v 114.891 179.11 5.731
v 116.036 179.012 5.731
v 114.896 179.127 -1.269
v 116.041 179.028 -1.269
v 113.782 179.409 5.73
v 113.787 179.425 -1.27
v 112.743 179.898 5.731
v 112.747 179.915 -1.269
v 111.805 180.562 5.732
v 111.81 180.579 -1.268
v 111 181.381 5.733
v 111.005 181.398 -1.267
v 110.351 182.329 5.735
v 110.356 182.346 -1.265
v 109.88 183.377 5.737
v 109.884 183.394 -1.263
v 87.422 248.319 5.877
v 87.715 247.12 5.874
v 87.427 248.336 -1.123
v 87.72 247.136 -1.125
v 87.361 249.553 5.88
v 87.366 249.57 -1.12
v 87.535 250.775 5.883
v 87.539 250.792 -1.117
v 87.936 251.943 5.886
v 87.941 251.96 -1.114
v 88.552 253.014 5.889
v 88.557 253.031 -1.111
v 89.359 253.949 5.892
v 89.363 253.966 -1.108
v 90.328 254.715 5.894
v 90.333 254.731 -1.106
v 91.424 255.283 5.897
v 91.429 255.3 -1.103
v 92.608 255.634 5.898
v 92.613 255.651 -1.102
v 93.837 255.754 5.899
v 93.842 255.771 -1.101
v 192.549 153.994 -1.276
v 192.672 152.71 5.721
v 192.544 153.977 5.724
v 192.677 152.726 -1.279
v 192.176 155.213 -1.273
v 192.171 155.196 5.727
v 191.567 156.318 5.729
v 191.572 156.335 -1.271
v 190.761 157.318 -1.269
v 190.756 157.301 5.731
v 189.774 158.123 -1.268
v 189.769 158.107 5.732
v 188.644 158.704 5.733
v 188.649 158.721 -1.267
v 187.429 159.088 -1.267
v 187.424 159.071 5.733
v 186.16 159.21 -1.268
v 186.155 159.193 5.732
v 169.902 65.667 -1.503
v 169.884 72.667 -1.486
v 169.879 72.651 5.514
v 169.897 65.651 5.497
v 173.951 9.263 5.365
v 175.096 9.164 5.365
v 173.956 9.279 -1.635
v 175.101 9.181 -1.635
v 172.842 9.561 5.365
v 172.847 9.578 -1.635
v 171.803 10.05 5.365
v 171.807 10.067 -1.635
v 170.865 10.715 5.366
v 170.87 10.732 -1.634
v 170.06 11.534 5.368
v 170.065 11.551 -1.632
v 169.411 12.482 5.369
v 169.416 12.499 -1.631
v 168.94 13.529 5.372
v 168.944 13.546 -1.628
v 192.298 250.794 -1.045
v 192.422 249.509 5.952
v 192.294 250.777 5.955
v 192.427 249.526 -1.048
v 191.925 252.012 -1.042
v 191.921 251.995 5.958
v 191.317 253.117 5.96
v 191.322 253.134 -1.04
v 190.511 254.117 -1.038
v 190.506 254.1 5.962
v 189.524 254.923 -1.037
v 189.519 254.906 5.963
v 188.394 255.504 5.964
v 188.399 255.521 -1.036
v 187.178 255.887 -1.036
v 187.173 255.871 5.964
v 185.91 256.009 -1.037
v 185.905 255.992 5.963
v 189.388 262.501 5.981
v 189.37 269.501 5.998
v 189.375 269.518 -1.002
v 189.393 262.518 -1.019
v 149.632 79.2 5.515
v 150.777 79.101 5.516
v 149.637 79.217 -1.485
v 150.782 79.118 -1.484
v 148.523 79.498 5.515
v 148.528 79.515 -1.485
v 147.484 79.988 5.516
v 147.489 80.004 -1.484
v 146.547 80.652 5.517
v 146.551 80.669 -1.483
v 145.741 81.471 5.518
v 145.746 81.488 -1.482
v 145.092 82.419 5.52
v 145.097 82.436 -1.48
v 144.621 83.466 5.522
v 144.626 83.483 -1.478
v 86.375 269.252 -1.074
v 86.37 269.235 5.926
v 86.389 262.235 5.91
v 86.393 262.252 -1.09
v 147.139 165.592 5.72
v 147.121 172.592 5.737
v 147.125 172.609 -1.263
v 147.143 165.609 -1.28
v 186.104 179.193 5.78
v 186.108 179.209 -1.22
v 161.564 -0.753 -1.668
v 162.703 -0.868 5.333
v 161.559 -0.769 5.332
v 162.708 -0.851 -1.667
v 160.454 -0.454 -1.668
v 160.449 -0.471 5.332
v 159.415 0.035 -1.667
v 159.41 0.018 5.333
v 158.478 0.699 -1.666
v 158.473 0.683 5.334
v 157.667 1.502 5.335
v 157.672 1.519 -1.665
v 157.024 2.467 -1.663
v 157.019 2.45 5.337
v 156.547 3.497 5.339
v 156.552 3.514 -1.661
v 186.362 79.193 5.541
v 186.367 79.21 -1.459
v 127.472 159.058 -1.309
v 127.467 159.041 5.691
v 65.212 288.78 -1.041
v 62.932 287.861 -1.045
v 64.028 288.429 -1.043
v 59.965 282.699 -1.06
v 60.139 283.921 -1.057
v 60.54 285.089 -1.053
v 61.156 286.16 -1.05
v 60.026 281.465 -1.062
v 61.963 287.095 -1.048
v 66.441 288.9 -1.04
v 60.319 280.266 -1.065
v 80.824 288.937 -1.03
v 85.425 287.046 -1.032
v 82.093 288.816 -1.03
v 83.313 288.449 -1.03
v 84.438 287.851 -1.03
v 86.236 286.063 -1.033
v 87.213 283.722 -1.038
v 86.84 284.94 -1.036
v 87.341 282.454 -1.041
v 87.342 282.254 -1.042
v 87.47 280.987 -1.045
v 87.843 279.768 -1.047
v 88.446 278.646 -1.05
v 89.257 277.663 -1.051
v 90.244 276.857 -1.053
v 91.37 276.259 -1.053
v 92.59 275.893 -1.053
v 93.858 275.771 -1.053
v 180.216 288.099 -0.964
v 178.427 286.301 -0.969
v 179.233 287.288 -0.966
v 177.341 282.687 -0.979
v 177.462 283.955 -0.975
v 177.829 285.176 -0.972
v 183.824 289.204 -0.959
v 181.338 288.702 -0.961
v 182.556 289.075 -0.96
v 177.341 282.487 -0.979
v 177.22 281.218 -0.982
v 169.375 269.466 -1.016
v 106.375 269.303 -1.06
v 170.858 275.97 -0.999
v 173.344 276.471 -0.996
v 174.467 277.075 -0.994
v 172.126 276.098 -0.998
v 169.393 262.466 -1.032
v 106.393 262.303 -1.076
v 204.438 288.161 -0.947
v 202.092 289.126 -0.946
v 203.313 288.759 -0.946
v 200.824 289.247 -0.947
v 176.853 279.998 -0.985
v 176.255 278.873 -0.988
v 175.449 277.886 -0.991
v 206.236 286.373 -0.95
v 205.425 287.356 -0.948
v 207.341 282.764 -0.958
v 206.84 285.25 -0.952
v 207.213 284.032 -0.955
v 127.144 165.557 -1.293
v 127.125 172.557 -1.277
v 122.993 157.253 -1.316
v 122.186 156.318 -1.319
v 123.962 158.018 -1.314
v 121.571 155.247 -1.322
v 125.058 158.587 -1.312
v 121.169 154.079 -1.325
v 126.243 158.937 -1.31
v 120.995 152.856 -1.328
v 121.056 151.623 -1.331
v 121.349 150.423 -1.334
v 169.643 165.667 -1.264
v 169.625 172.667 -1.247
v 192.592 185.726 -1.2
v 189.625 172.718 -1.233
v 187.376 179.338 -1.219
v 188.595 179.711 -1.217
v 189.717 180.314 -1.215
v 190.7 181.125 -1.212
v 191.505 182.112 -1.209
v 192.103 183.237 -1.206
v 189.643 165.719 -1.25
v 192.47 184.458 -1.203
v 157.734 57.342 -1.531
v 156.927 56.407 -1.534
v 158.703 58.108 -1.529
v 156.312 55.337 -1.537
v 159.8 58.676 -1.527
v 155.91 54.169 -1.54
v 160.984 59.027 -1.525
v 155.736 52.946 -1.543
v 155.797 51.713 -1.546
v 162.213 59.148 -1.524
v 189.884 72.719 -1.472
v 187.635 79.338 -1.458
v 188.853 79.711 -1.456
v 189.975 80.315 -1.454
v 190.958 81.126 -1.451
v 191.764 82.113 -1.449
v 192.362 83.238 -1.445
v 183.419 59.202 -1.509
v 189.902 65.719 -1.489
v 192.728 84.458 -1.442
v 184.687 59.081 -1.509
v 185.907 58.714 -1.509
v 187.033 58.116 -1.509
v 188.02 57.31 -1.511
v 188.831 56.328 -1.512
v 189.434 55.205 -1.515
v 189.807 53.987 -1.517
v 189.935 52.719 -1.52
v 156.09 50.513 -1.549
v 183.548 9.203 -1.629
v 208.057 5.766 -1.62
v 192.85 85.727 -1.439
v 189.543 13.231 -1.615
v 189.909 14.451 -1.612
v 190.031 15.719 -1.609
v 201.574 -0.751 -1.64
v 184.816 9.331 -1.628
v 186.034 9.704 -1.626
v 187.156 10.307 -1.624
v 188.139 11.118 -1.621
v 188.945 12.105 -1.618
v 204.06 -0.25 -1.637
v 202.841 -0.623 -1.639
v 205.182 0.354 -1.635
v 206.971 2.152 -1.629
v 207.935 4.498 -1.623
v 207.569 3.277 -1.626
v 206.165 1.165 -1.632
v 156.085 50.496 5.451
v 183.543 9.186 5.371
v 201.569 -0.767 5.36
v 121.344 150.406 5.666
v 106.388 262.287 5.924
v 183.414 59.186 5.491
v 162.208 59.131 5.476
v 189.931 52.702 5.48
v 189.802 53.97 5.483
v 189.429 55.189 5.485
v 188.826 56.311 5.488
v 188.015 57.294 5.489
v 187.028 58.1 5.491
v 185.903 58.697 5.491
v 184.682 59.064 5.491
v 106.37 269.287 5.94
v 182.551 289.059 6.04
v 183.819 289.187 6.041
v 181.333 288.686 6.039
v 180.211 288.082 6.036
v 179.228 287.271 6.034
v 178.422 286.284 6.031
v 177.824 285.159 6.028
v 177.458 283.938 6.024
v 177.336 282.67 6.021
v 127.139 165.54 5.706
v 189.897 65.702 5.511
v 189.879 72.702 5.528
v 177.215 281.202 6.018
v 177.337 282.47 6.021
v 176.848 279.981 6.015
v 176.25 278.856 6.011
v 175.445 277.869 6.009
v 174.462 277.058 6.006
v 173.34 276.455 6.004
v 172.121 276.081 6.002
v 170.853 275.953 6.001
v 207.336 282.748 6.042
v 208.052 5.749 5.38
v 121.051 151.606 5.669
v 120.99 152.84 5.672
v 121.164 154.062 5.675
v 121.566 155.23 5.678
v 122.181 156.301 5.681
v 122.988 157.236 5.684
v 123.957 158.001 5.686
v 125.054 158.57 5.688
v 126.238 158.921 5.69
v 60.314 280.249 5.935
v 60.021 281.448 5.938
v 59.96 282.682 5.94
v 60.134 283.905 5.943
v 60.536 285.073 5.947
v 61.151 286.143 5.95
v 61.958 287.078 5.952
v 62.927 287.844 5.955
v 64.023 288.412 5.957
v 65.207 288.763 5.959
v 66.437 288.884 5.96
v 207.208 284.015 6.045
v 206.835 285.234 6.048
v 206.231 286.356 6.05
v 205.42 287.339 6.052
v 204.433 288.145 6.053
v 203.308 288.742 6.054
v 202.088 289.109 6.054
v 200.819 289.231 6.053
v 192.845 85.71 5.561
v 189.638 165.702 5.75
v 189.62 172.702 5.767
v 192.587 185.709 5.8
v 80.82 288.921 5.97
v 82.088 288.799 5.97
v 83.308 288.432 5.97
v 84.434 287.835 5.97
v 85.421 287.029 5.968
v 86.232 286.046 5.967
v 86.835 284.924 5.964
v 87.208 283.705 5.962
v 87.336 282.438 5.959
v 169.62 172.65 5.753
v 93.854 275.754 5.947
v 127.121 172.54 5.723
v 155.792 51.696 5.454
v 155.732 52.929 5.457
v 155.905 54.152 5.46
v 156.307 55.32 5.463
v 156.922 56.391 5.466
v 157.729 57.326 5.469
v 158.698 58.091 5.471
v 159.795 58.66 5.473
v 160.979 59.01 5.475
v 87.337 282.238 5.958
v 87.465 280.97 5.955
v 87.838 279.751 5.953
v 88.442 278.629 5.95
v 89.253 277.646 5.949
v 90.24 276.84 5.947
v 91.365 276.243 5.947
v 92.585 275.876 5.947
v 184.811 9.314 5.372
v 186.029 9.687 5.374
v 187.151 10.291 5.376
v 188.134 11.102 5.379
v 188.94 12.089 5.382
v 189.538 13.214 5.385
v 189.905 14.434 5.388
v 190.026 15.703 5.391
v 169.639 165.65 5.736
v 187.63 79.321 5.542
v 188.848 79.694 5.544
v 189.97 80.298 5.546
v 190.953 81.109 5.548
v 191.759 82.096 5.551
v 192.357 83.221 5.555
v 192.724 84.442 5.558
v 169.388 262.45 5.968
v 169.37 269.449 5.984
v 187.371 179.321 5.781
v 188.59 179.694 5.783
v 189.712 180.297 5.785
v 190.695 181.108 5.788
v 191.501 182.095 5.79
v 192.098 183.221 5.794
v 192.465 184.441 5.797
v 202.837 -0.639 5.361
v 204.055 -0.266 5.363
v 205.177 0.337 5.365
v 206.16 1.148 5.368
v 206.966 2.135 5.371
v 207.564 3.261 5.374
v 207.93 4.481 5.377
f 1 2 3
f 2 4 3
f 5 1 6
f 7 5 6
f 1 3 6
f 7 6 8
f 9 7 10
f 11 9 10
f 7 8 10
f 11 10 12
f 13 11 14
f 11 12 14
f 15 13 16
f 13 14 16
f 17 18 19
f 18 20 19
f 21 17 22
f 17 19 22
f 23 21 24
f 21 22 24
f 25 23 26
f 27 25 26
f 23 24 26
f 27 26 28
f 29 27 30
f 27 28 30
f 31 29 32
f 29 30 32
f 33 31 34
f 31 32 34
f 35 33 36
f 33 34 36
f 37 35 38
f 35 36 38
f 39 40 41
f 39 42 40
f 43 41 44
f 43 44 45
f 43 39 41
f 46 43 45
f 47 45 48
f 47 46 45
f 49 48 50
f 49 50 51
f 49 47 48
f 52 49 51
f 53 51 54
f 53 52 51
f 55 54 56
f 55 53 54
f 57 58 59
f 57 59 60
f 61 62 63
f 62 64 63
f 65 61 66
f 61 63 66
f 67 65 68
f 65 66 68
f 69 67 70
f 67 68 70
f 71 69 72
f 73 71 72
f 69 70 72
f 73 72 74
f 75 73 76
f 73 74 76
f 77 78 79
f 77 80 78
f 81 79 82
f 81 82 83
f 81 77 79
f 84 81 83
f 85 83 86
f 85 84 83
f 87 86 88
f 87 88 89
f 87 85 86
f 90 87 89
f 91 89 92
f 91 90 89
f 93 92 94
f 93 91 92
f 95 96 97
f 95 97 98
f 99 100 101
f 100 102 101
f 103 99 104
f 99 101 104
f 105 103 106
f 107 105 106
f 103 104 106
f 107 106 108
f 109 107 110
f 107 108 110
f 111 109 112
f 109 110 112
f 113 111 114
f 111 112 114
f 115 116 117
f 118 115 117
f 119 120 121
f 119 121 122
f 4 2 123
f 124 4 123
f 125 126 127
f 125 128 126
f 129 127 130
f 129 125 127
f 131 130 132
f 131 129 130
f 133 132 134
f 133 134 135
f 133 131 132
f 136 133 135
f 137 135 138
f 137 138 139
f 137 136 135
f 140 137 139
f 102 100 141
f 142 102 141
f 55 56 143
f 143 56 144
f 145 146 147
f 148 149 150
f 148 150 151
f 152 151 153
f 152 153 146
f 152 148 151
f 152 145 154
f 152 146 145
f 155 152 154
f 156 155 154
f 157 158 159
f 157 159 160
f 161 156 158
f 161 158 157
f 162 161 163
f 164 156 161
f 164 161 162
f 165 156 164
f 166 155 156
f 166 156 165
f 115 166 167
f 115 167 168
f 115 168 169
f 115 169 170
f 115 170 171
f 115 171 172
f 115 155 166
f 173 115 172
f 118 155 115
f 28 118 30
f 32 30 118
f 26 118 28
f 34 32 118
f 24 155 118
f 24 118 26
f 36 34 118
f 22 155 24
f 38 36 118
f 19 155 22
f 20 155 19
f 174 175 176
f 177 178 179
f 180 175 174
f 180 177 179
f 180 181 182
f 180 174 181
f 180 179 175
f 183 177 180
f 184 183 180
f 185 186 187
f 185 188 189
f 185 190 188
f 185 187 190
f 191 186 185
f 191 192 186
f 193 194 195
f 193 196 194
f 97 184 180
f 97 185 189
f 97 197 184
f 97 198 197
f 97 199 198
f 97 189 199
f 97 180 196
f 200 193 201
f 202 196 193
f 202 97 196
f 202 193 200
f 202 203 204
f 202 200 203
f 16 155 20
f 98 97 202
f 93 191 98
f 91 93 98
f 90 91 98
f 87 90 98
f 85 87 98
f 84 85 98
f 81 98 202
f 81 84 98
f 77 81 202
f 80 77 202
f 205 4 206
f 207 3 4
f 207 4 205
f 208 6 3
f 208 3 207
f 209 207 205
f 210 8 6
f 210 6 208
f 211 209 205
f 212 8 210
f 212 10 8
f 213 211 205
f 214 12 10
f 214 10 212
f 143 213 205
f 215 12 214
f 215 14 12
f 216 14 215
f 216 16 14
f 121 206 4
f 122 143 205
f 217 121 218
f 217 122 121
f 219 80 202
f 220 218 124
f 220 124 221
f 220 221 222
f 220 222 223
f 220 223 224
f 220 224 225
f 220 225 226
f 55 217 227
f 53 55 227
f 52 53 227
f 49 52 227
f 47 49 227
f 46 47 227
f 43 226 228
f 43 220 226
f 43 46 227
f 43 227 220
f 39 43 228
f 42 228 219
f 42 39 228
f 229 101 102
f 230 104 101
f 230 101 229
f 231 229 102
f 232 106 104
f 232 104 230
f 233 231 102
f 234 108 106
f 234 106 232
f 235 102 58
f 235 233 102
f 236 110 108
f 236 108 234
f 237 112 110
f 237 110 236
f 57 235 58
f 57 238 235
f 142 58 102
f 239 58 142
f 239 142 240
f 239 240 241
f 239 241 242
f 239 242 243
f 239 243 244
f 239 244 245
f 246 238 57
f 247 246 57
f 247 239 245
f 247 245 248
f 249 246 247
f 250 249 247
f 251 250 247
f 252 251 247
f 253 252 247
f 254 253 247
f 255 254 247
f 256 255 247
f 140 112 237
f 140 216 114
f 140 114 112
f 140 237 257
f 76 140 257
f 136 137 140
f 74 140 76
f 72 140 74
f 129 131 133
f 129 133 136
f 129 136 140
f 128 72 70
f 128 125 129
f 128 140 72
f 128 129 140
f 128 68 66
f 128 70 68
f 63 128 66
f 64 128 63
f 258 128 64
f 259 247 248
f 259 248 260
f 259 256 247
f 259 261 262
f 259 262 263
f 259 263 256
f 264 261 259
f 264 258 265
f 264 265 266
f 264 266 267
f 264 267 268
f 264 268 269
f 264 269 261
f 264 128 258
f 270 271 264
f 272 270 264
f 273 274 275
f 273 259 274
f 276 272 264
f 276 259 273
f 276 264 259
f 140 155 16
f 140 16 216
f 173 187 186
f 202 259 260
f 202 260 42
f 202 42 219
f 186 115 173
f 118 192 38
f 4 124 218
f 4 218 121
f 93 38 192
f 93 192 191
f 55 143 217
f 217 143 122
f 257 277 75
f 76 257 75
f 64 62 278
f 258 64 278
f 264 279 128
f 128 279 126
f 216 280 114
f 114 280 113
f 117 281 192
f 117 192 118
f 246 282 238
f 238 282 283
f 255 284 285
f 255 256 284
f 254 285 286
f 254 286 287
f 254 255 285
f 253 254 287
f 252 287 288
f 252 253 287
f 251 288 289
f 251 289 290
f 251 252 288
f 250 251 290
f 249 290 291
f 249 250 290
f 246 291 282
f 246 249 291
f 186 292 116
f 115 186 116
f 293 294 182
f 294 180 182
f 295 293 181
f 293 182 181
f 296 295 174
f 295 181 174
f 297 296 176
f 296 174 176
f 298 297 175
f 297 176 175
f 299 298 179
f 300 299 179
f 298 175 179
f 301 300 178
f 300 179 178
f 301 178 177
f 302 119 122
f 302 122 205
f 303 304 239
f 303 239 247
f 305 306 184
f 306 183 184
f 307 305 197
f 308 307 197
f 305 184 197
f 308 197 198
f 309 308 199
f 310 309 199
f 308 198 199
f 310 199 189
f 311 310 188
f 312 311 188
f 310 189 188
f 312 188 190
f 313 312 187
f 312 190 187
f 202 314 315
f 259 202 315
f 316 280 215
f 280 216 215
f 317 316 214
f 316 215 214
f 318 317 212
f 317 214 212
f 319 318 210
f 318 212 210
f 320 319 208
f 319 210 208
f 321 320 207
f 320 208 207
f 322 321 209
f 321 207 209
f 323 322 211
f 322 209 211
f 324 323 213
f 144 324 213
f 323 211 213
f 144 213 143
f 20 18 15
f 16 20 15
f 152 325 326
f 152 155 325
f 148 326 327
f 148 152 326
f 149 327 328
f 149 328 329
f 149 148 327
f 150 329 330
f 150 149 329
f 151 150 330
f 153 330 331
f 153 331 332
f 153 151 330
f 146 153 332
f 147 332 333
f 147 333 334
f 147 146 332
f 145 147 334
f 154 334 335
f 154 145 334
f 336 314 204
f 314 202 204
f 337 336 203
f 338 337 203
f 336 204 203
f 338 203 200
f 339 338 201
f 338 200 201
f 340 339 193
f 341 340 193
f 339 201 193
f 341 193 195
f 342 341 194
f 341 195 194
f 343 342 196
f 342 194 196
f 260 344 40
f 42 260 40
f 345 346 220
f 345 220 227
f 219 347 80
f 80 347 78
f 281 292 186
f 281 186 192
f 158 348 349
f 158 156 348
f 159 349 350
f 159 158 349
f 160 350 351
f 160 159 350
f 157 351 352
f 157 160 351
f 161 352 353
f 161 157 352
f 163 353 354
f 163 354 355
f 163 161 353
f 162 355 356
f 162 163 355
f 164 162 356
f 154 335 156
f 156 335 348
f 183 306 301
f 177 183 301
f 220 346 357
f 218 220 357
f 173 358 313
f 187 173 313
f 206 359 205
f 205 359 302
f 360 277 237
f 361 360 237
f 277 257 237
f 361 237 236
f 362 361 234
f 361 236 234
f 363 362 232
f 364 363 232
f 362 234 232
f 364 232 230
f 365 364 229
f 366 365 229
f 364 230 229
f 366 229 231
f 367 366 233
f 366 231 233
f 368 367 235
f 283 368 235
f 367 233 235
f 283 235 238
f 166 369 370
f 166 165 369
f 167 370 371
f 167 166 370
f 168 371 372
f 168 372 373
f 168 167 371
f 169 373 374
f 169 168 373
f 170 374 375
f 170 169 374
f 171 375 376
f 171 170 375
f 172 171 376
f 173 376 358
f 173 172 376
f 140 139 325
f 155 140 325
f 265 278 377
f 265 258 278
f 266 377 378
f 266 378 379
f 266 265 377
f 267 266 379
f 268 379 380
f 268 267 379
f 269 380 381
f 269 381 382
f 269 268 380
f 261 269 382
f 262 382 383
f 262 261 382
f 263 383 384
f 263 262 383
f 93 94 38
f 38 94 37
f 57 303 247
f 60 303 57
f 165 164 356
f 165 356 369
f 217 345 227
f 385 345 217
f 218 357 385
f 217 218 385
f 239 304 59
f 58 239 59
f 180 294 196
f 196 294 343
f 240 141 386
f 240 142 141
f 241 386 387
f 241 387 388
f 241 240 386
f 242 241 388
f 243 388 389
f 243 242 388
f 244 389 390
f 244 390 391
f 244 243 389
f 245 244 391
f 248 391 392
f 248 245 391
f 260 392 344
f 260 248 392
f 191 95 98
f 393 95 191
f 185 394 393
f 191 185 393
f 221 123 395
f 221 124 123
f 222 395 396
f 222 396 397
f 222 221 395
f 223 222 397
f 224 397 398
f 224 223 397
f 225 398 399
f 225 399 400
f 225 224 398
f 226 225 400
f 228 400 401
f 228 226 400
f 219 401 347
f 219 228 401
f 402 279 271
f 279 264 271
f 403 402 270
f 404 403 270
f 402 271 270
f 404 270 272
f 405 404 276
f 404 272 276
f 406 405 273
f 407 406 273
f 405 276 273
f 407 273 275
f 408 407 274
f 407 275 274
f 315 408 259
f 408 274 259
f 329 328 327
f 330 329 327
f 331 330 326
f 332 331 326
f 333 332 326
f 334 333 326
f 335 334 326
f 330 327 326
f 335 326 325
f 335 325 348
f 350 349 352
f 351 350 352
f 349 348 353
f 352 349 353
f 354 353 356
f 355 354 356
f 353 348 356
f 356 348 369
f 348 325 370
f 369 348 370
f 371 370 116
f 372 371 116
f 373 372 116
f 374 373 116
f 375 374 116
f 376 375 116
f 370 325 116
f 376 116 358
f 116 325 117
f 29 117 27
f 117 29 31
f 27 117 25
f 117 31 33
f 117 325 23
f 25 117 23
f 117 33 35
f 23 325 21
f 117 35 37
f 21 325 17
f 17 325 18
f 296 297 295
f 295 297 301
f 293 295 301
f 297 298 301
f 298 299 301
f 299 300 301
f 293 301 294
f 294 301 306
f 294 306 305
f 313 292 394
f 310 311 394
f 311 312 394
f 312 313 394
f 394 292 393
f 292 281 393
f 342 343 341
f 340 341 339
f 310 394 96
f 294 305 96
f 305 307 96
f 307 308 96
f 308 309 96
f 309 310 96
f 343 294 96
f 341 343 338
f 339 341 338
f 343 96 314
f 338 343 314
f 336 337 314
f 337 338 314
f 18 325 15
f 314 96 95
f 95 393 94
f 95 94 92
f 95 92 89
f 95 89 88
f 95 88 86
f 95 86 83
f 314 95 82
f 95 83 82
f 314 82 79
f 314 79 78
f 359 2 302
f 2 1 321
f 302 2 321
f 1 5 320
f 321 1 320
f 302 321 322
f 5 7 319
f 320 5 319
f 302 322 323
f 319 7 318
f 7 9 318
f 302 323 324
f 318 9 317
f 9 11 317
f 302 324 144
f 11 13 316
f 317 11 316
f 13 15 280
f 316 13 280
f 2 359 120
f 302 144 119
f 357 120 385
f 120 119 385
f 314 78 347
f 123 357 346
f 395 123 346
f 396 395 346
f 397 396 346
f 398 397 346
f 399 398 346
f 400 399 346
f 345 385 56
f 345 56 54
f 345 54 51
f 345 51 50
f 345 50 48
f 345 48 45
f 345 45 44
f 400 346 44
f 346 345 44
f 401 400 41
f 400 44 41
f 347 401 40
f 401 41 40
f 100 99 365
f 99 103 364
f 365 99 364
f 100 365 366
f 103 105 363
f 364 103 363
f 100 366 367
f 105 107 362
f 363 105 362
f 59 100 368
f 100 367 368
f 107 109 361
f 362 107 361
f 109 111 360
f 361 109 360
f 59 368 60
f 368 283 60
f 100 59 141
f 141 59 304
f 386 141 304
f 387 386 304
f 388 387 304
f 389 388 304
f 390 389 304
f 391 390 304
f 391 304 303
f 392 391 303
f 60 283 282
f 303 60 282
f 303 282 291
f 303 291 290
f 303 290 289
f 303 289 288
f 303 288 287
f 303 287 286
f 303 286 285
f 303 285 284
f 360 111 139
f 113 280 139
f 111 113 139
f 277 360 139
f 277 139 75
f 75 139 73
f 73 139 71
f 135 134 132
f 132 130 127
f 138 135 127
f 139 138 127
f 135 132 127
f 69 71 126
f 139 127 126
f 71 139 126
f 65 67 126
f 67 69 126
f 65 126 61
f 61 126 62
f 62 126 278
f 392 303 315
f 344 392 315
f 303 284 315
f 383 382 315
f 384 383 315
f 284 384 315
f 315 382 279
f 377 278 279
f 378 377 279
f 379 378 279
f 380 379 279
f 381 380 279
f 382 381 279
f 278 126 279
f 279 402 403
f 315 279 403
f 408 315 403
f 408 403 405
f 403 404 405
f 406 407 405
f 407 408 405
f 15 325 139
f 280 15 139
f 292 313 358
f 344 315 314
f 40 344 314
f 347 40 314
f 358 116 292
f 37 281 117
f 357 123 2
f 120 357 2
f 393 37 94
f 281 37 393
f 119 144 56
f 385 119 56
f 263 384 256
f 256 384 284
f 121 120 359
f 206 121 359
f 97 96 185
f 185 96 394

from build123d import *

# Parameters (mm, degrees)
SKETCH_W               = 20
SKETCH_H               = 7
PAD_DEPTH              = 7
FILLET_R               = 6.5
MIRROR_ROLL_ANGLE      = -179.860318
MIRROR_PITCH_ANGLE     = 1.669328
MIRROR_PLACEMENT_ANGLE = 0.337481


with BuildPart() as body:
    # Sketch → Pad (new body)
    with BuildSketch(Plane.XY):
        Polygon((0, 290), (50, 290), (150, 0), (120, 0), (120, 13.2), (30, 13.2), (30, 0), (0, 0), align=None)
        Polygon((15, 210), (15, 130), (89.30566, 130), (61.719453, 210), align=None, mode=Mode.SUBTRACT)
        Polygon((15, 110), (15, 33.2), (122.684971, 33.2), (96.202212, 110), align=None, mode=Mode.SUBTRACT)
        Polygon((18, 280), (18, 230), (54.822902, 230), (37.581522, 280), align=None, mode=Mode.SUBTRACT)
        with Locations((28, 220)):
            Rectangle(SKETCH_W, SKETCH_H, mode=Mode.SUBTRACT)
        with Locations((28, 120)):
            Rectangle(SKETCH_W, SKETCH_H, mode=Mode.SUBTRACT)
        with Locations((70.5, 120)):
            Rectangle(SKETCH_W, SKETCH_H, mode=Mode.SUBTRACT)
        with Locations((28, 23.2)):
            Rectangle(SKETCH_W, SKETCH_H, mode=Mode.SUBTRACT)
        with Locations((111, 23.2)):
            Rectangle(SKETCH_W, SKETCH_H, mode=Mode.SUBTRACT)
    extrude(amount=PAD_DEPTH)

    # Fillet
    fillet_edges = [body.edges().sort_by_distance(p)[0] for p in [
        (0, 0, 3.5),
        (50, 290, 3.5),
        (0, 290, 3.5),
        (150, 0, 3.5),
        (120, 0, 3.5),
        (30, 0, 3.5),
        (61.719453, 210, 3.5),
        (15, 210, 3.5),
        (96.202212, 110, 3.5),
        (15, 110, 3.5),
        (15, 130, 3.5),
        (15, 33.2, 3.5),
        (122.684971, 33.2, 3.5),
        (89.30566, 130, 3.5),
        (30, 13.2, 3.5),
        (120, 13.2, 3.5),
        (18, 280, 3.5),
        (18, 230, 3.5),
        (37.581522, 280, 3.5),
        (54.822902, 230, 3.5),
    ]]
    fillet(fillet_edges, radius=FILLET_R)


with BuildPart() as body_1:
    # Body placement: moved
    add(body.part.moved(Location((-2, 0, 0))))


with BuildPart() as body_mirrored:
    # mirror: instance of Body
    add(body_1.part.mirror(Plane(origin=(159.181488, 124.226166, 5.790833), x_dir=(-0.001618, 0.999999, 0), z_dir=(-0.999887, -0.001617, 0.014919))))


with BuildPart() as body_mirrored_1:
    # mirror roll: moved
    add(body_mirrored.part.rotate(Axis((0, 0, 0), (1, 0, 0)), MIRROR_ROLL_ANGLE))


with BuildPart() as body_mirrored_2:
    # mirror pitch: moved
    add(body_mirrored_1.part.rotate(Axis((0, 0, 0), (0, 1, 0)), MIRROR_PITCH_ANGLE))


with BuildPart() as body_mirrored_3:
    # mirror placement: moved
    add(body_mirrored_2.part.moved(Location((-113.201923, 287.892908, 10.586))).rotate(Axis((-113.201923, 287.892908, 10.586), (0, 0, 1)), MIRROR_PLACEMENT_ANGLE))


solid = body_mirrored_3.part
